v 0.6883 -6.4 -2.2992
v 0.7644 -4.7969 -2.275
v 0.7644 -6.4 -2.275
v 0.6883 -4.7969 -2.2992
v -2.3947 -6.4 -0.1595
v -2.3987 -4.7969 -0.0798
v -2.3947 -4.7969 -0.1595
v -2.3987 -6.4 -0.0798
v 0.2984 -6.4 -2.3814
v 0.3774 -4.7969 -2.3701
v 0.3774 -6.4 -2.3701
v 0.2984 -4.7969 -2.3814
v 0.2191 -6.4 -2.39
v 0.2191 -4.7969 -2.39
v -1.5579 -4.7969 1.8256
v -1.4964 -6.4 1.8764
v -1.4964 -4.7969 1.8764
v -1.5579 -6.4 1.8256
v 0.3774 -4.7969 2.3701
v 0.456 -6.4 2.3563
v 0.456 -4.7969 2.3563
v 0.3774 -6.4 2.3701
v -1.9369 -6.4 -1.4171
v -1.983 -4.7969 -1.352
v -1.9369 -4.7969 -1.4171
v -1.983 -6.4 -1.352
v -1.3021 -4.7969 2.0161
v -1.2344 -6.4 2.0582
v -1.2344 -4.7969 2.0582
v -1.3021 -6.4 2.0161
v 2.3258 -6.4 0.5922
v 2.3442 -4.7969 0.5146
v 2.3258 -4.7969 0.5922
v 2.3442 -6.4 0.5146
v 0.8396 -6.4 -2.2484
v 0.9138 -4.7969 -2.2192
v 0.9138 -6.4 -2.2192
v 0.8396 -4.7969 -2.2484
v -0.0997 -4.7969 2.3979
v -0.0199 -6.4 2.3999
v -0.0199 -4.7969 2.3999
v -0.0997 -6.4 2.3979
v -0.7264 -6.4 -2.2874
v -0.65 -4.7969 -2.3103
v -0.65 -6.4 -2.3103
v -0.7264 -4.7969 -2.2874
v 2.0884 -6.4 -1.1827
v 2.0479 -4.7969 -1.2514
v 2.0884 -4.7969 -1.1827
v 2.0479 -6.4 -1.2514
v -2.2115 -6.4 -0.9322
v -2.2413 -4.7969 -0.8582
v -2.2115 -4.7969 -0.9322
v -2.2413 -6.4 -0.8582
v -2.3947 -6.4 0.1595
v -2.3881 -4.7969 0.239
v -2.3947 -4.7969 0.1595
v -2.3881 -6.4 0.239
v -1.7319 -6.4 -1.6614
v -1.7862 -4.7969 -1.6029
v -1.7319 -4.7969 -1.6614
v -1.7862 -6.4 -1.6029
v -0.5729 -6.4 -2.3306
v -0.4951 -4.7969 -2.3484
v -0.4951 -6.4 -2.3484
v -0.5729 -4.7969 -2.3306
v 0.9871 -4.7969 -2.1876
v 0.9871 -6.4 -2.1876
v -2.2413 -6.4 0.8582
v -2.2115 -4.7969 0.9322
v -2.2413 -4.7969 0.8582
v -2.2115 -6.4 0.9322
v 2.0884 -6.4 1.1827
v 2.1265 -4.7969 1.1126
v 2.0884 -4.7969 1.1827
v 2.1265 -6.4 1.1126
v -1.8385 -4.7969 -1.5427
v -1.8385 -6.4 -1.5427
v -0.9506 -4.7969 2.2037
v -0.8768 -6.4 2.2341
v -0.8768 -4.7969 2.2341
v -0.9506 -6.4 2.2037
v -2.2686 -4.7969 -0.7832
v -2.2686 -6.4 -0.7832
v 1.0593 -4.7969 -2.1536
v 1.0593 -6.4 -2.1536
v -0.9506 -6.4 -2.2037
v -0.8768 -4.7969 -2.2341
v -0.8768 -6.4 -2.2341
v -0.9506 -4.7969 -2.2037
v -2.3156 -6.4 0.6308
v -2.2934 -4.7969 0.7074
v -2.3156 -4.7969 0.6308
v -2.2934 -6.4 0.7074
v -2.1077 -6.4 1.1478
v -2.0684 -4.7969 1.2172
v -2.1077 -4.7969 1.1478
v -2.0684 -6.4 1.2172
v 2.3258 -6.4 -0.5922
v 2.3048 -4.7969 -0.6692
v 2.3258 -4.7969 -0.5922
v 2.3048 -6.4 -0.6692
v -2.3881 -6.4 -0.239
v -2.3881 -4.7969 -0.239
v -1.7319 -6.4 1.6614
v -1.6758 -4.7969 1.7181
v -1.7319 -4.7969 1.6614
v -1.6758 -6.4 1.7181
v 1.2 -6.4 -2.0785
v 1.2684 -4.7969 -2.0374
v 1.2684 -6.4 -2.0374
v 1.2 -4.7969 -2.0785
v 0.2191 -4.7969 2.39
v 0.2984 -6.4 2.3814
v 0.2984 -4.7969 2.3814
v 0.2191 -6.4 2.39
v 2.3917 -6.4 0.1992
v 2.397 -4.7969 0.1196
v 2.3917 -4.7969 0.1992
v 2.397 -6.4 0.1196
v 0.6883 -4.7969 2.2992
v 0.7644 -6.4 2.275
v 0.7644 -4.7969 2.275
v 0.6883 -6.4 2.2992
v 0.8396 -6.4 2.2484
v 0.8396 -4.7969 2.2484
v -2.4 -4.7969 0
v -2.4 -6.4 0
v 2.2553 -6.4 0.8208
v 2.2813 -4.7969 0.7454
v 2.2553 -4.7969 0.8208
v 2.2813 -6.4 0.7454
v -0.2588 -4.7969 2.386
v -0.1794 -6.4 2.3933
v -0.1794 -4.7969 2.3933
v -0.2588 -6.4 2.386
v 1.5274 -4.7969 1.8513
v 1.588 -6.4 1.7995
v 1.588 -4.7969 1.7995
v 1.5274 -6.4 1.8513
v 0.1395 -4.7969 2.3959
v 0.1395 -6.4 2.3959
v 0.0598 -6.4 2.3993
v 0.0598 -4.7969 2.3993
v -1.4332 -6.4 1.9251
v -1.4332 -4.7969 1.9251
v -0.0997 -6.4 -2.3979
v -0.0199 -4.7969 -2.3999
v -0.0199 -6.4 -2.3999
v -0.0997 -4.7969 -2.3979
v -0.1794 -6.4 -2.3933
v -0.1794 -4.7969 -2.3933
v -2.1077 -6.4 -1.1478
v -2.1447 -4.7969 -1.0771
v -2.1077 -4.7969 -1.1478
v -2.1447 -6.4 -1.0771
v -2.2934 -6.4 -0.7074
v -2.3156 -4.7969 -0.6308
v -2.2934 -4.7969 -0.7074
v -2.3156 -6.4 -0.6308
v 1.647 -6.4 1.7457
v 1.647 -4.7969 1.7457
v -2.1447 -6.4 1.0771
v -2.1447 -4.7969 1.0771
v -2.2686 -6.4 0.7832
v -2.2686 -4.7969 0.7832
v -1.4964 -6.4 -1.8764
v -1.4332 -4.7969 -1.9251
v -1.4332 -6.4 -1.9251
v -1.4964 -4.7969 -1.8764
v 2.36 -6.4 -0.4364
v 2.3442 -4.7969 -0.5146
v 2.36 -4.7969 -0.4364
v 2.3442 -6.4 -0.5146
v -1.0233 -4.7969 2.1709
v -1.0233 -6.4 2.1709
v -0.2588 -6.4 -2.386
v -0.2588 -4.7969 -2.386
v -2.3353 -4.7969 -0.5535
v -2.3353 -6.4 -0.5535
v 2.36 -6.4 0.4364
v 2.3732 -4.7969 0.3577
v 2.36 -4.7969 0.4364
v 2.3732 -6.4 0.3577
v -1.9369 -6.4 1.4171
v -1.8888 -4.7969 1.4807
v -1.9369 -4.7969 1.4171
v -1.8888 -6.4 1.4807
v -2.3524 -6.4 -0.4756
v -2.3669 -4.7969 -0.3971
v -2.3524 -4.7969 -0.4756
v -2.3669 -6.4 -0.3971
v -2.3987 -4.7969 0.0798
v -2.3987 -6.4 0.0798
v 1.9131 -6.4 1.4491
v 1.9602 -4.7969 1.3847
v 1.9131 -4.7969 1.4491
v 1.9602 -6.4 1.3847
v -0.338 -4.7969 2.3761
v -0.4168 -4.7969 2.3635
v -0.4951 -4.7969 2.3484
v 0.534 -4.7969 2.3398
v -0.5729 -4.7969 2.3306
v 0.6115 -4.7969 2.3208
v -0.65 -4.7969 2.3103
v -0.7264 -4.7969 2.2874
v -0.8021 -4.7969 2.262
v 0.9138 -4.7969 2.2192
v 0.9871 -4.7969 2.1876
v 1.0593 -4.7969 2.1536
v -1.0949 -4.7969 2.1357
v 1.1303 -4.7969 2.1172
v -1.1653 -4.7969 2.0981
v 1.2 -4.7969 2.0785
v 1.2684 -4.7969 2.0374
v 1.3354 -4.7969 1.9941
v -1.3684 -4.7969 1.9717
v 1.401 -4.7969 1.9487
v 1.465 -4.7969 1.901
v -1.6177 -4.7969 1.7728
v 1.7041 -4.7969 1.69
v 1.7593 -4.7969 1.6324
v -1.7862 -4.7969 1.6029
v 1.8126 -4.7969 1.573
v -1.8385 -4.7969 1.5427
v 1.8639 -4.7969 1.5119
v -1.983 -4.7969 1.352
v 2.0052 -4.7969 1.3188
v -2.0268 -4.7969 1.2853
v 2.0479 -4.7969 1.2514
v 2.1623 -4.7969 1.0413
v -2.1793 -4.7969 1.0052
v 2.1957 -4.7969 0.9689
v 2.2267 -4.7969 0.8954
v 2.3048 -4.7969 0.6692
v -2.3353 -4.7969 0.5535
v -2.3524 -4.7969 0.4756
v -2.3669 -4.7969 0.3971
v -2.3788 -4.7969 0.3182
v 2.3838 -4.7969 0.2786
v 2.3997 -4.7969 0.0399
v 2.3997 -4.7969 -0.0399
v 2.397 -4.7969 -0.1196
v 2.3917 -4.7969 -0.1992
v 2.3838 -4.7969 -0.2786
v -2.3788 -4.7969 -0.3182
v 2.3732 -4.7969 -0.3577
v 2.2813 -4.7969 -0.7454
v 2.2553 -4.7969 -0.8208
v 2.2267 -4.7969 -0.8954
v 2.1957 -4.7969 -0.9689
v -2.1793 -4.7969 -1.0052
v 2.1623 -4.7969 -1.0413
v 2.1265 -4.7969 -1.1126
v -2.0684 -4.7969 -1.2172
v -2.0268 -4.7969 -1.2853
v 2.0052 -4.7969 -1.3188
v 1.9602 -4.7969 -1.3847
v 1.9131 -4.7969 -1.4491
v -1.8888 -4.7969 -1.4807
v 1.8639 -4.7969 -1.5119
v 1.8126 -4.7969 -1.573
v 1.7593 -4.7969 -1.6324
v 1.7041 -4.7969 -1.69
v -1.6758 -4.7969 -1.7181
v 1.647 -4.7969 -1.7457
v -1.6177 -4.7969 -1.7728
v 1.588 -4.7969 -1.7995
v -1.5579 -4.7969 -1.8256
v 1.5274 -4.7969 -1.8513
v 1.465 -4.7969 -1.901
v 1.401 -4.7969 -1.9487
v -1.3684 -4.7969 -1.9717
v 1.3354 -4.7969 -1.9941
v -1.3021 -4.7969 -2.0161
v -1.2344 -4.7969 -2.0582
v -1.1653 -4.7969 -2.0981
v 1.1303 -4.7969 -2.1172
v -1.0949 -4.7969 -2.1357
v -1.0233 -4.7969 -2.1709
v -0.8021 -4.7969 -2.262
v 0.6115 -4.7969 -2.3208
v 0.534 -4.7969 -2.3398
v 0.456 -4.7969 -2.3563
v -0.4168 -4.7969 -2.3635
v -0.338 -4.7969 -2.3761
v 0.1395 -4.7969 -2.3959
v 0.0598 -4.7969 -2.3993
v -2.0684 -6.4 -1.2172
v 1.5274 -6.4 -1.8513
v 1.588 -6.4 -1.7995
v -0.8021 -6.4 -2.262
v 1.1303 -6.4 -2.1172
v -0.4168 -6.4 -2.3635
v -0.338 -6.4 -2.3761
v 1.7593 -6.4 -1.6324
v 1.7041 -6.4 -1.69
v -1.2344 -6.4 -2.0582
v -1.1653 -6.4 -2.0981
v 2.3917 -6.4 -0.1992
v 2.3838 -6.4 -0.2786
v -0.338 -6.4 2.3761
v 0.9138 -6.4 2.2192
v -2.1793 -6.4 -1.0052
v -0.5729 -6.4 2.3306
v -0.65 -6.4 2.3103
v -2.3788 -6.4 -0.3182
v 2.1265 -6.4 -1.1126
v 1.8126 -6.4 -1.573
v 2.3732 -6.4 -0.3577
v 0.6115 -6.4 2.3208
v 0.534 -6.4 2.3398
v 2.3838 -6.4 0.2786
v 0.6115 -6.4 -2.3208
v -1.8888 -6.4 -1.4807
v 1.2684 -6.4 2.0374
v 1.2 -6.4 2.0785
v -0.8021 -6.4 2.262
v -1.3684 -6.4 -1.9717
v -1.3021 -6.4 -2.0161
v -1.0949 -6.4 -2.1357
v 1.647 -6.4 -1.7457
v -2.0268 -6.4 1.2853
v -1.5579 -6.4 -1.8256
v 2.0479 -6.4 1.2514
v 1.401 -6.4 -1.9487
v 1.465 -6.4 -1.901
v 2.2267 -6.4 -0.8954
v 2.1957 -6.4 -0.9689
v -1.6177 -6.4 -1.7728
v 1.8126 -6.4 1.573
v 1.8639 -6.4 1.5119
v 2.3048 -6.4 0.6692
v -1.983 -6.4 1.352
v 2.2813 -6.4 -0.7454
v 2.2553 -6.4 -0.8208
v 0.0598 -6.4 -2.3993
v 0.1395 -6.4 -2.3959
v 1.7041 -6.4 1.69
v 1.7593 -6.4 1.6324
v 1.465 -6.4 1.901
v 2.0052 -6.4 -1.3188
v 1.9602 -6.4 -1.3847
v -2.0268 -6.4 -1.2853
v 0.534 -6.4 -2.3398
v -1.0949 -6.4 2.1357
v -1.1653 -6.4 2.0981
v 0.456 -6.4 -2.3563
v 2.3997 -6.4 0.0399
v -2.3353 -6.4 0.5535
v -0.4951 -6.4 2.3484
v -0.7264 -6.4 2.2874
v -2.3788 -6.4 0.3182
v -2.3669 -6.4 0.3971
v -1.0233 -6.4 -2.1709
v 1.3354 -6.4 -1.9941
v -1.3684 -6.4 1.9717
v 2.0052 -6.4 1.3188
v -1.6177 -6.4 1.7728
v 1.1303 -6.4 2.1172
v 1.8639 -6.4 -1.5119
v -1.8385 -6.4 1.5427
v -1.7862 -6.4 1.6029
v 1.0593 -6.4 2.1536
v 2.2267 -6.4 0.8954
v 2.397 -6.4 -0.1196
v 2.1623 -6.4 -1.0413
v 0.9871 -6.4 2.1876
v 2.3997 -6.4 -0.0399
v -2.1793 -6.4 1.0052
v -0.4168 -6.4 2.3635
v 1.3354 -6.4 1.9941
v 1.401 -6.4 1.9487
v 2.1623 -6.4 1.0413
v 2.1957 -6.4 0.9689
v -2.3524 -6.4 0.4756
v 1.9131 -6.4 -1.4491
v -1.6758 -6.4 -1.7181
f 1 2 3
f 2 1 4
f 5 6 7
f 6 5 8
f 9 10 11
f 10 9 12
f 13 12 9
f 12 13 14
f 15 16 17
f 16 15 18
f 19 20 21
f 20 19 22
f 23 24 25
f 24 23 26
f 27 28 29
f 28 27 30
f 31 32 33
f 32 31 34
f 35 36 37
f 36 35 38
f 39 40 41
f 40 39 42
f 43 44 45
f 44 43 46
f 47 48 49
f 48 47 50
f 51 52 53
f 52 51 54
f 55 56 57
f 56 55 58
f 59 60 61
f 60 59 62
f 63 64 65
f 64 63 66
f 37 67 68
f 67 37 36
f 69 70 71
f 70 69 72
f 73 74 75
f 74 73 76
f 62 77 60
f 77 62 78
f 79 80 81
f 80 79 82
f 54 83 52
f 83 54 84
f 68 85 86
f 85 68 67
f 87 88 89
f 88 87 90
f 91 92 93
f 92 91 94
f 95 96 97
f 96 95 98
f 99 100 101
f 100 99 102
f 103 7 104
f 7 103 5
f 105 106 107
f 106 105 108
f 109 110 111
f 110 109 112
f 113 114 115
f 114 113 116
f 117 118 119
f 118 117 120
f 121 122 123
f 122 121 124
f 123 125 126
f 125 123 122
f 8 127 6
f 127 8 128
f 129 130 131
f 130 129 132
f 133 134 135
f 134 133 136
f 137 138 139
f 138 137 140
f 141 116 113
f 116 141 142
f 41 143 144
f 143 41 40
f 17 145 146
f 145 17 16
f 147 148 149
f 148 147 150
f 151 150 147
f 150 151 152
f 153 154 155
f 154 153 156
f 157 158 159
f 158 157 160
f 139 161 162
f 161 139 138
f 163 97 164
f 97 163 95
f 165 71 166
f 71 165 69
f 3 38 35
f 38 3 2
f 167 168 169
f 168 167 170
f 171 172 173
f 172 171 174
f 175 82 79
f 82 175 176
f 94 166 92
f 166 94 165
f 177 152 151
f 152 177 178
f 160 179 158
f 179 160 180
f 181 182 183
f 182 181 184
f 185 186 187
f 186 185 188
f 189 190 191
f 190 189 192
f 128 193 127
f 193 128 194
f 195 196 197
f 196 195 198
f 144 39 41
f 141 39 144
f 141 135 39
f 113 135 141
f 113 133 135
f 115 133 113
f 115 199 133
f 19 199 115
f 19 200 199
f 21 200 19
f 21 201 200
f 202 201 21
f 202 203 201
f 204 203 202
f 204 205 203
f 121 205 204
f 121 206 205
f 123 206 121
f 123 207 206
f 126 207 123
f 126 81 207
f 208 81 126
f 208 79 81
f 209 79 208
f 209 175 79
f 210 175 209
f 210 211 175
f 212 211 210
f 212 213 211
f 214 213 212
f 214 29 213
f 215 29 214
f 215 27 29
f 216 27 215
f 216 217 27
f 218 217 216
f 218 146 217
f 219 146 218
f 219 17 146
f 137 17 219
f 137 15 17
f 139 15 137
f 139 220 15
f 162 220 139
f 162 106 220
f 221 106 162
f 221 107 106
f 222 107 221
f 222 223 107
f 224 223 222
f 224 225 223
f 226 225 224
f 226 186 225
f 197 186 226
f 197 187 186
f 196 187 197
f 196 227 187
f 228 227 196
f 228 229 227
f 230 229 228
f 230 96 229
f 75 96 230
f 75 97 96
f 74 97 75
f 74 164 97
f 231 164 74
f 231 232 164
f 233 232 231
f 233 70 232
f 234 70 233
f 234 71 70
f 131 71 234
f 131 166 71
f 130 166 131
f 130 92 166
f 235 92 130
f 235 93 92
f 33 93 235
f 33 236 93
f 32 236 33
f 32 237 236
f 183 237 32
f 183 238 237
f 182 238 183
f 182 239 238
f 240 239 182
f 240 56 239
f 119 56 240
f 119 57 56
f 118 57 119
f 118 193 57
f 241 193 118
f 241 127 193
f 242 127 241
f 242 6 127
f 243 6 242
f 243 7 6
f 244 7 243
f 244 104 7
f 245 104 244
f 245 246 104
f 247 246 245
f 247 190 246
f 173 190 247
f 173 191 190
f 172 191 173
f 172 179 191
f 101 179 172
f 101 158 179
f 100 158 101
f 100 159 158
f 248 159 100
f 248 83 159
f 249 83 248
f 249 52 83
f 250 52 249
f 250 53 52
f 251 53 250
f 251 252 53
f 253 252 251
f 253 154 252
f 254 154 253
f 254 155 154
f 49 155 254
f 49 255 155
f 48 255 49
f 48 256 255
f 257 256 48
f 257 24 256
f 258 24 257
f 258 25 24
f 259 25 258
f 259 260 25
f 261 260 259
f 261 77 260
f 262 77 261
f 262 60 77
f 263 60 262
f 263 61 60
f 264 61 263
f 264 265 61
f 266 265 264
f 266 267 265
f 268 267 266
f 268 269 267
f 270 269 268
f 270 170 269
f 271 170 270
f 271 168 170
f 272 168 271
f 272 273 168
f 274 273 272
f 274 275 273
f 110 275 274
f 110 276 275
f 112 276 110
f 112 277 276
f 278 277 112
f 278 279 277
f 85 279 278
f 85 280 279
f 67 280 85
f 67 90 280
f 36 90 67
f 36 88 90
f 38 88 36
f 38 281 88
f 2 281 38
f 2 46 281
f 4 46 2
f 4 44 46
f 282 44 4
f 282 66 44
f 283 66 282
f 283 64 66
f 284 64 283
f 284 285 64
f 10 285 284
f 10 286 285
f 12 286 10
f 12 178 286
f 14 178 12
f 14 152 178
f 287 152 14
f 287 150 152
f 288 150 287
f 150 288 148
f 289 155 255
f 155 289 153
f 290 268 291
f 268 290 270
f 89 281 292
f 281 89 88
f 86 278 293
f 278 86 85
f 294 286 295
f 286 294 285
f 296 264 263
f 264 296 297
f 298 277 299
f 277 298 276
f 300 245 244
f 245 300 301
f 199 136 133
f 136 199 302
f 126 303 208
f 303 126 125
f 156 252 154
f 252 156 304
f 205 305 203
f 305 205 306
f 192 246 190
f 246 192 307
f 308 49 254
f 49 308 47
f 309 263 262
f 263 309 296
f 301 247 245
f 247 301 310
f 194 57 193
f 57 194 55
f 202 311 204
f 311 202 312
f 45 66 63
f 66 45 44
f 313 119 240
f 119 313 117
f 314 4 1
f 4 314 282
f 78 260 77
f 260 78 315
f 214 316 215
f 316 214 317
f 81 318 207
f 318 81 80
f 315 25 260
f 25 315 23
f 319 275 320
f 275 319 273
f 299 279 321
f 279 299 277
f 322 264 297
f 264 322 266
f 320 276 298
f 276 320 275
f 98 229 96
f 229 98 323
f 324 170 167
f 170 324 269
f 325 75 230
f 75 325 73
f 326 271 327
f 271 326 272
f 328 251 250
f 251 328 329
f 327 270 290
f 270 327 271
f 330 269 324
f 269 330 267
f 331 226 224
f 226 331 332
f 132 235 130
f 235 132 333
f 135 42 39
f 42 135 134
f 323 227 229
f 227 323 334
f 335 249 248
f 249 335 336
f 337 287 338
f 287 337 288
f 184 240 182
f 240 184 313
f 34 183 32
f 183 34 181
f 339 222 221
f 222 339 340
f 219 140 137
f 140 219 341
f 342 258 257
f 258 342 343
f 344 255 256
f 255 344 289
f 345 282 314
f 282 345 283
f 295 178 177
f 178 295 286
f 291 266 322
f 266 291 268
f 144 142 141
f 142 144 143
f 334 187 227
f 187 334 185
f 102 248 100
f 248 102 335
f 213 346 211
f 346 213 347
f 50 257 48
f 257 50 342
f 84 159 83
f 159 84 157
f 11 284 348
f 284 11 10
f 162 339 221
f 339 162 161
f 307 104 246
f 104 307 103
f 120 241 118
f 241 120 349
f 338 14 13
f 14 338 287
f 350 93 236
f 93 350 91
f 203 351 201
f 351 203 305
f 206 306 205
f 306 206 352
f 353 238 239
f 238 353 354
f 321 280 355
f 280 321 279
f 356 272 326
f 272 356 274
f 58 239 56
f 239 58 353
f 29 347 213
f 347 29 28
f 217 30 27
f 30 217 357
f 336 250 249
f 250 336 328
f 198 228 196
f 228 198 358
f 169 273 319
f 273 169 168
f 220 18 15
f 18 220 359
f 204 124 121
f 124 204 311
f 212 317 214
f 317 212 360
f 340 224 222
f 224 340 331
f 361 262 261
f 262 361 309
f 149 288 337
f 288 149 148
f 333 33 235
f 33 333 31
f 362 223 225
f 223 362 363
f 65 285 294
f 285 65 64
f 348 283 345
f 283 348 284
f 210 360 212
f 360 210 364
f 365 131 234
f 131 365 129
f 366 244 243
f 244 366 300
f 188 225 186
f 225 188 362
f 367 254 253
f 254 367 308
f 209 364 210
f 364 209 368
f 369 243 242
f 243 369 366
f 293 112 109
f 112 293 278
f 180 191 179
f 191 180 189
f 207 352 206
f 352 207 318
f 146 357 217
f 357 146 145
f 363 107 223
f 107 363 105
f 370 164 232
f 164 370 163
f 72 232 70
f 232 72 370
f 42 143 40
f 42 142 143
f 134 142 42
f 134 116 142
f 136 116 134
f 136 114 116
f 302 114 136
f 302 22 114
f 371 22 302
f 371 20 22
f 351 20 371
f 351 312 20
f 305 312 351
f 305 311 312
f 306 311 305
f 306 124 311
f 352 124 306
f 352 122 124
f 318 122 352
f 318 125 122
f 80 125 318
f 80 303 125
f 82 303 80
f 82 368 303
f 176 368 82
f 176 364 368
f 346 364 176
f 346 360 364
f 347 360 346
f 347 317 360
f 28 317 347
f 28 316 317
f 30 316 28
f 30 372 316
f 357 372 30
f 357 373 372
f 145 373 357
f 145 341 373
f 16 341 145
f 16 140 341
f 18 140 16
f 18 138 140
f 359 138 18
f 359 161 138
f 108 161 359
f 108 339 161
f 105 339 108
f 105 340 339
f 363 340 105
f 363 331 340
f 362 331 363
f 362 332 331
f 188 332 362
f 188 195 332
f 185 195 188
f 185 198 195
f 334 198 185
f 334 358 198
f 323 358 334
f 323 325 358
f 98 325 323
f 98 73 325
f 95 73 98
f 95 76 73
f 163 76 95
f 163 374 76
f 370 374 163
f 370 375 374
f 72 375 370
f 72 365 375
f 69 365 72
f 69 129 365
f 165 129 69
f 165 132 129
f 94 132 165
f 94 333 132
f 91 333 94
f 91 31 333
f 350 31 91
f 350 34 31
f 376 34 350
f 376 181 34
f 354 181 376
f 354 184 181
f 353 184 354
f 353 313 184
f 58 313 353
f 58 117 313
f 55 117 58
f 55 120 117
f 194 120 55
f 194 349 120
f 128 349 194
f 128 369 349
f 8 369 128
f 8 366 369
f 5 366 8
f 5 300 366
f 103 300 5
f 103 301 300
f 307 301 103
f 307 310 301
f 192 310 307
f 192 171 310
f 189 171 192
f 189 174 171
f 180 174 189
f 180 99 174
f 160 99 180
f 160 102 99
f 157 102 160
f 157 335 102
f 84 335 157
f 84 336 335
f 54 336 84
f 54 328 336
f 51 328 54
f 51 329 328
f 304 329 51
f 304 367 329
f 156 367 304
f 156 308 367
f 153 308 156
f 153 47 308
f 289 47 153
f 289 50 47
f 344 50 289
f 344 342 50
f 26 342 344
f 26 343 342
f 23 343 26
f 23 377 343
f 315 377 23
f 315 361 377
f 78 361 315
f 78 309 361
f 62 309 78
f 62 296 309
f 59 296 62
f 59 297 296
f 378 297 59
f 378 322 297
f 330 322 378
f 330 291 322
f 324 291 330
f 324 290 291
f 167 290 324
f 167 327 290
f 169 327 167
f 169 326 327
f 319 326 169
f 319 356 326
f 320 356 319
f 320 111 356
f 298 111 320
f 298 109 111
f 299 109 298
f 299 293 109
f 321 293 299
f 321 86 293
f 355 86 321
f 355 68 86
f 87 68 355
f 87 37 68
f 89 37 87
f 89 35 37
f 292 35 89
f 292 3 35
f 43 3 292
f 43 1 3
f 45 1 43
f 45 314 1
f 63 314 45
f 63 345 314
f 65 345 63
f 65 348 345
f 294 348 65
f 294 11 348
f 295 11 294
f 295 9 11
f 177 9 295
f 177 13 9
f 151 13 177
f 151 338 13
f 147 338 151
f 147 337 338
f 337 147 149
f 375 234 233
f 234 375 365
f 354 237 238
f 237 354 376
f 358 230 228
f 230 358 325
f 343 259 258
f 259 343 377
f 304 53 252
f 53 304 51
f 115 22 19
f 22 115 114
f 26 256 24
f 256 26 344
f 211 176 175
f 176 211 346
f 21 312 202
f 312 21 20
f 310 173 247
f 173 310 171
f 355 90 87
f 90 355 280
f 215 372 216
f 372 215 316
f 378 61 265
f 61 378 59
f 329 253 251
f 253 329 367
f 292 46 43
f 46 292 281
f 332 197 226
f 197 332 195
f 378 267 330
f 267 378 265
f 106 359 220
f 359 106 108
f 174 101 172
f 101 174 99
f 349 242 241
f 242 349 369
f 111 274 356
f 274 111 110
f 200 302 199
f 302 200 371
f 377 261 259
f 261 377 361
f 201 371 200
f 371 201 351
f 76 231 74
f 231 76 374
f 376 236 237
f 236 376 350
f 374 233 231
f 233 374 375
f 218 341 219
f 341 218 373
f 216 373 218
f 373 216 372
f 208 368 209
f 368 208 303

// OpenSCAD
use <../lib.scad>
use <../p/4-4cylc.scad>
use <../p/4-4ring1.scad>
use <../p/4-4ring3.scad>
use <s/243s01.scad>
$fa=1; $fs=0.2;
function ldraw_lib__u9550(realsolid=false) = [
// 0 ~Train Wheel Spoked with Cylindrical Rim with 6 LDU Axle Hole
// 0 Name: u9550.dat
// 0 Author: Willy Tschager [Holly-Wood]
// 0 !LDRAW_ORG Part UPDATE 2022-03
// 0 !LICENSE Licensed under CC BY 2.0 and CC BY 4.0 : see CAreadme.txt
// 
// 0 BFC CERTIFY CCW
  [0,"BFC","CERTIFY"],
  [0,"BFC","CCW"],
// 
// 0 !HISTORY 2022-05-07 [PTadmin] Official Update 2022-03
// 
// 
// 0 // Subpart
// 1 16 0 0 0 1 0 0 0 1 0 0 0 1 s\243s01.dat
  [1,16,0,0,0,1,0,0,0,1,0,0,0,1, ldraw_lib__s__243s01(realsolid)],
// 
// 0 // Axle connector
// 1 16 0 0 10 3 0 0 0 0 -3 0 -1 0 4-4ring1.dat
  [1,16,0,0,10,3,0,0,0,0,-3,0,-1,0, ldraw_lib__4_4ring1(realsolid)],
// 1 16 0 0 10 2 0 0 0 0 -2 0 -1 0 4-4ring3.dat
  [1,16,0,0,10,2,0,0,0,0,-2,0,-1,0, ldraw_lib__4_4ring3(realsolid)],
// 0 BFC INVERTNEXT
  [0,"BFC","INVERTNEXT"],
// 1 16 0 0 -8 -3 0 0 0 0 3 0 18 0 4-4cylc.dat
  [1,16,0,0,-8,-3,0,0,0,0,3,0,18,0, ldraw_lib__4_4cylc(realsolid)],
];
module ldraw_lib__u9550(step=0, col=false, unit=2/5, alt=false, line=0.2, solid=!$preview)
    makepoly(ldraw_lib__u9550(solid), step=step, col=col, unit=unit, alt=alt, line=line, solid=solid);
ldraw_lib__u9550(line=0.2);
